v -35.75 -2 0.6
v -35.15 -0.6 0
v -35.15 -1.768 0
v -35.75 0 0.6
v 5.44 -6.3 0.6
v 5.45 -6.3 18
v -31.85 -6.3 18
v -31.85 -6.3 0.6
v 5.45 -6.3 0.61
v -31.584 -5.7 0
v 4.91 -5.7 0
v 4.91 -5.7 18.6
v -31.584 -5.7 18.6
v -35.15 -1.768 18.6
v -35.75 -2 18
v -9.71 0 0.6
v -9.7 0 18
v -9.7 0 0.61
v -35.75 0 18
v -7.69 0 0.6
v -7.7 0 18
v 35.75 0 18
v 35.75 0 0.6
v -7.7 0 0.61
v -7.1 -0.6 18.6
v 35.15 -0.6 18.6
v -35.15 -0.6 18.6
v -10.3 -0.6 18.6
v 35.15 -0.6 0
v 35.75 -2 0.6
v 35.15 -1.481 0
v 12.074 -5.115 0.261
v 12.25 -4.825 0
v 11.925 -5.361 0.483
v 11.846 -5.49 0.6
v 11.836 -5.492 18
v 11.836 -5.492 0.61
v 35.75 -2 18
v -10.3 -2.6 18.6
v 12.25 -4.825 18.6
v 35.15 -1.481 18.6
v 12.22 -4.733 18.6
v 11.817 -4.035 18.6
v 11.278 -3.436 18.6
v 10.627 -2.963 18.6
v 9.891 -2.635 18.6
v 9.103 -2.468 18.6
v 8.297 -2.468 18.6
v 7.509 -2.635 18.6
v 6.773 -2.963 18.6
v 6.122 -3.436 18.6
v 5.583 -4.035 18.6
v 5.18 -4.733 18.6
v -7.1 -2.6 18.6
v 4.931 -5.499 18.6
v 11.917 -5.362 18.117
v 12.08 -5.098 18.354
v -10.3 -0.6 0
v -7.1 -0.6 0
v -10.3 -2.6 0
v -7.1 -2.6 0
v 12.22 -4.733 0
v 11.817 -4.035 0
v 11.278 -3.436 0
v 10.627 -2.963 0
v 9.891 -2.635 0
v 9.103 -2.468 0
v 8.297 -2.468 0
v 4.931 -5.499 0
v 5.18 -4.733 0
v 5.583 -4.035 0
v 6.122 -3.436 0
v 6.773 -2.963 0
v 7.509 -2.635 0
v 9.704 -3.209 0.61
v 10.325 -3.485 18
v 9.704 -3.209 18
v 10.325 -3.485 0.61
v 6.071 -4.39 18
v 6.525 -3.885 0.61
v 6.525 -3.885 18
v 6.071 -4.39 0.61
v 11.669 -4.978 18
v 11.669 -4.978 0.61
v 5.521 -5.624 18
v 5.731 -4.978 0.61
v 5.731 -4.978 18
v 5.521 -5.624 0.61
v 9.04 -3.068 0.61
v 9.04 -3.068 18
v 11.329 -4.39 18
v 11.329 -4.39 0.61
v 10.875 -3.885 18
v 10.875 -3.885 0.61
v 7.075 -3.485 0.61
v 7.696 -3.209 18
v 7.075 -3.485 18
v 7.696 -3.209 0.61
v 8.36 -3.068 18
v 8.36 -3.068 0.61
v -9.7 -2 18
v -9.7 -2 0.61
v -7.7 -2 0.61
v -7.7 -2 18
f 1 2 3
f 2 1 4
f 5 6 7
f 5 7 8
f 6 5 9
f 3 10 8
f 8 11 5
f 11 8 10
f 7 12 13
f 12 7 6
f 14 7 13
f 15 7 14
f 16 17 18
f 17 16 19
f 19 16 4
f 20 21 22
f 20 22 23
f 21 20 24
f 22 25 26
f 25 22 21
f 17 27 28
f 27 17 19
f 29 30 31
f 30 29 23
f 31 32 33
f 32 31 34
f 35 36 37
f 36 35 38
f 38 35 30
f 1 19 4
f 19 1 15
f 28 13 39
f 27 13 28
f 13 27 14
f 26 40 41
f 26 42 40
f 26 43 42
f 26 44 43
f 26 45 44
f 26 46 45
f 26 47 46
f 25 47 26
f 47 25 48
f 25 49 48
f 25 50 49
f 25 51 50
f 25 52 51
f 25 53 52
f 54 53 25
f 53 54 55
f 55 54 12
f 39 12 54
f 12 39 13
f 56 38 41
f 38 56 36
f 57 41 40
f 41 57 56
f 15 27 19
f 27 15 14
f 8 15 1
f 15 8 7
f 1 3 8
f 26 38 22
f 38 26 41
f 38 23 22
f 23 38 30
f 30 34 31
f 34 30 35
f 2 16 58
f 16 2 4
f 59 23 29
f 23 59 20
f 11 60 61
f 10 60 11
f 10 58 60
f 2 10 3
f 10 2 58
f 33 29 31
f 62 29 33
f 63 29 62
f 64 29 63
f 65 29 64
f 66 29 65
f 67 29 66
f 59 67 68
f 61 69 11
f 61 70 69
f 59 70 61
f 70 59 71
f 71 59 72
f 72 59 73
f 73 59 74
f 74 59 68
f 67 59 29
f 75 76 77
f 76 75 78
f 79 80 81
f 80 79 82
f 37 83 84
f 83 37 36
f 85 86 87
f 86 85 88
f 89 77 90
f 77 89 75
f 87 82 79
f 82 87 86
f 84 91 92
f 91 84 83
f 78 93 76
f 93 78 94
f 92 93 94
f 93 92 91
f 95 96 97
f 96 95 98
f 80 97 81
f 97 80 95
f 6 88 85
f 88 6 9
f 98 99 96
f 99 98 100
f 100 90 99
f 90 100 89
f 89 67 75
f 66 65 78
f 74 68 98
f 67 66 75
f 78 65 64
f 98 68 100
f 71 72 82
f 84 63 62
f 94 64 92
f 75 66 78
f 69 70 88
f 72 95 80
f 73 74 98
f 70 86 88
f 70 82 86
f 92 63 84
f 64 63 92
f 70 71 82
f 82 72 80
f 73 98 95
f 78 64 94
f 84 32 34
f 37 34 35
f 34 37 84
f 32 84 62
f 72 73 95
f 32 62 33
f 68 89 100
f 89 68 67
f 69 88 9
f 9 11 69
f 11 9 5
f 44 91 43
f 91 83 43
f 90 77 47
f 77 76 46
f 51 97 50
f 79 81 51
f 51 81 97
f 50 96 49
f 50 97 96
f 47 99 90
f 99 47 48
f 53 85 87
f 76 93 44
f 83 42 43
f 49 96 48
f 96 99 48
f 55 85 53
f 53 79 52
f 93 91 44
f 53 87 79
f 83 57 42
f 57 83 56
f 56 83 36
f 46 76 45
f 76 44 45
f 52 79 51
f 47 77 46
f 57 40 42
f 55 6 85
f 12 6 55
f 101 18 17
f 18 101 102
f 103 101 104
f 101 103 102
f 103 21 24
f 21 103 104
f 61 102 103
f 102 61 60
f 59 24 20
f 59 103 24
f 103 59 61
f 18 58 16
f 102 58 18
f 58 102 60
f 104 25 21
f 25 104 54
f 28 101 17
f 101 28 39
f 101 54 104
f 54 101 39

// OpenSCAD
chit_t=1;
inch=25.4;
ep=0.01;
bevel=.6;

module chit()
{
    rad=2;
    hull()
    {
        //top and bottom
        linear_extrude(chit_t)minkowski()
        {
            circle(r=inch/2-rad*2,$fn=6);
            circle(r=rad-chit_t/2,$fn=30);
        }
        //midline
        translate([0,0,chit_t/2-ep/2])linear_extrude(ep)minkowski()
        {
            circle(r=inch/2-rad*2,$fn=6);
            circle(r=rad,$fn=30);
        }
    }
}

//chit();
peg_t=6.3; //thickness of the peg, how wide in profile
peg_w=17.6;  //width of peg, side facing the user
peg_l=71.5; //length of peg
spring_t=1; //how much of a inset for the spring non-squaredness
axle=17.4; //distance between notch and center of spring
notch=2; //width of the notch
peg_tail=2; //thickness at the back
spring_r=6.5/2; //spring radius
//rotate([0,90,90])import("clothespeg.stl");
module clothespin()
{
    mirror([0,-1,0])difference()
    {
        hull()
        {
            translate([0,0,bevel])linear_extrude(spring_t+peg_w-bevel*2)cpin_pos();
            linear_extrude(spring_t+peg_w)offset(delta=-bevel)cpin_pos();
        }
        translate([0,0,-.5])linear_extrude(spring_t+peg_w+1)cpin_neg_a();
        hull()
        {
            translate([0,0,bevel])linear_extrude(ep)cpin_neg_a();
            translate([0,0,-ep])linear_extrude(ep)offset(delta=bevel)cpin_neg_a();
        }
        hull()
        {
            translate([0,0,spring_t+peg_w-bevel])linear_extrude(ep)cpin_neg_a();
            translate([0,0,spring_t+peg_w])linear_extrude(ep)offset(delta=bevel)cpin_neg_a();
        }
        translate([0,0,-.5])linear_extrude(spring_t+peg_w+1)cpin_neg_b();
        hull()
        {
            translate([0,0,bevel])linear_extrude(ep)cpin_neg_b();
            translate([0,0,-ep])linear_extrude(ep)offset(delta=bevel)cpin_neg_b();
        }
        hull()
        {
            translate([0,0,spring_t+peg_w-bevel])linear_extrude(ep)cpin_neg_b();
            translate([0,0,spring_t+peg_w])linear_extrude(ep)offset(delta=bevel)cpin_neg_b();
        }
        //translate([axle/2+spring_r/2,peg_t-.5,peg_w+spring_t])cylinder(r=spring_r+.5,h=spring_t*2+ep,$fn=30,center=true);
    }
}
module cpin_pos()
{
    //put the spring and notch such that they are the middle
    //tail_l is the distance from spring to the tail
    tail_l=peg_l/2-axle/2;
    //base_l is the length of the part where the peg touches itself
    base_l=peg_l-tail_l-peg_t;
    difference()
    {
        hull()
        {
            translate([0,peg_tail/2])square([peg_l,peg_tail],center=true);
            translate([-base_l/2+peg_t,peg_t-peg_tail/2])square([base_l,peg_tail],center=true);
        }
    }
}
module cpin_neg_a()
{
    //put the spring and notch such that they are the middle
    //tail_l is the distance from spring to the tail
    tail_l=peg_l/2-axle/2;
    //base_l is the length of the part where the peg touches itself
    base_l=peg_l-tail_l-peg_t;
    
        translate([axle/2,peg_t])circle(r=spring_r,$fn=30);
 
    
}
module cpin_neg_b()
{
    //put the spring and notch such that they are the middle
    //tail_l is the distance from spring to the tail
    tail_l=peg_l/2-axle/2;
    //base_l is the length of the part where the peg touches itself
    base_l=peg_l-tail_l-peg_t;


        translate([-axle/2,0])square([notch,notch*2],center=true);

}

clothespin();
